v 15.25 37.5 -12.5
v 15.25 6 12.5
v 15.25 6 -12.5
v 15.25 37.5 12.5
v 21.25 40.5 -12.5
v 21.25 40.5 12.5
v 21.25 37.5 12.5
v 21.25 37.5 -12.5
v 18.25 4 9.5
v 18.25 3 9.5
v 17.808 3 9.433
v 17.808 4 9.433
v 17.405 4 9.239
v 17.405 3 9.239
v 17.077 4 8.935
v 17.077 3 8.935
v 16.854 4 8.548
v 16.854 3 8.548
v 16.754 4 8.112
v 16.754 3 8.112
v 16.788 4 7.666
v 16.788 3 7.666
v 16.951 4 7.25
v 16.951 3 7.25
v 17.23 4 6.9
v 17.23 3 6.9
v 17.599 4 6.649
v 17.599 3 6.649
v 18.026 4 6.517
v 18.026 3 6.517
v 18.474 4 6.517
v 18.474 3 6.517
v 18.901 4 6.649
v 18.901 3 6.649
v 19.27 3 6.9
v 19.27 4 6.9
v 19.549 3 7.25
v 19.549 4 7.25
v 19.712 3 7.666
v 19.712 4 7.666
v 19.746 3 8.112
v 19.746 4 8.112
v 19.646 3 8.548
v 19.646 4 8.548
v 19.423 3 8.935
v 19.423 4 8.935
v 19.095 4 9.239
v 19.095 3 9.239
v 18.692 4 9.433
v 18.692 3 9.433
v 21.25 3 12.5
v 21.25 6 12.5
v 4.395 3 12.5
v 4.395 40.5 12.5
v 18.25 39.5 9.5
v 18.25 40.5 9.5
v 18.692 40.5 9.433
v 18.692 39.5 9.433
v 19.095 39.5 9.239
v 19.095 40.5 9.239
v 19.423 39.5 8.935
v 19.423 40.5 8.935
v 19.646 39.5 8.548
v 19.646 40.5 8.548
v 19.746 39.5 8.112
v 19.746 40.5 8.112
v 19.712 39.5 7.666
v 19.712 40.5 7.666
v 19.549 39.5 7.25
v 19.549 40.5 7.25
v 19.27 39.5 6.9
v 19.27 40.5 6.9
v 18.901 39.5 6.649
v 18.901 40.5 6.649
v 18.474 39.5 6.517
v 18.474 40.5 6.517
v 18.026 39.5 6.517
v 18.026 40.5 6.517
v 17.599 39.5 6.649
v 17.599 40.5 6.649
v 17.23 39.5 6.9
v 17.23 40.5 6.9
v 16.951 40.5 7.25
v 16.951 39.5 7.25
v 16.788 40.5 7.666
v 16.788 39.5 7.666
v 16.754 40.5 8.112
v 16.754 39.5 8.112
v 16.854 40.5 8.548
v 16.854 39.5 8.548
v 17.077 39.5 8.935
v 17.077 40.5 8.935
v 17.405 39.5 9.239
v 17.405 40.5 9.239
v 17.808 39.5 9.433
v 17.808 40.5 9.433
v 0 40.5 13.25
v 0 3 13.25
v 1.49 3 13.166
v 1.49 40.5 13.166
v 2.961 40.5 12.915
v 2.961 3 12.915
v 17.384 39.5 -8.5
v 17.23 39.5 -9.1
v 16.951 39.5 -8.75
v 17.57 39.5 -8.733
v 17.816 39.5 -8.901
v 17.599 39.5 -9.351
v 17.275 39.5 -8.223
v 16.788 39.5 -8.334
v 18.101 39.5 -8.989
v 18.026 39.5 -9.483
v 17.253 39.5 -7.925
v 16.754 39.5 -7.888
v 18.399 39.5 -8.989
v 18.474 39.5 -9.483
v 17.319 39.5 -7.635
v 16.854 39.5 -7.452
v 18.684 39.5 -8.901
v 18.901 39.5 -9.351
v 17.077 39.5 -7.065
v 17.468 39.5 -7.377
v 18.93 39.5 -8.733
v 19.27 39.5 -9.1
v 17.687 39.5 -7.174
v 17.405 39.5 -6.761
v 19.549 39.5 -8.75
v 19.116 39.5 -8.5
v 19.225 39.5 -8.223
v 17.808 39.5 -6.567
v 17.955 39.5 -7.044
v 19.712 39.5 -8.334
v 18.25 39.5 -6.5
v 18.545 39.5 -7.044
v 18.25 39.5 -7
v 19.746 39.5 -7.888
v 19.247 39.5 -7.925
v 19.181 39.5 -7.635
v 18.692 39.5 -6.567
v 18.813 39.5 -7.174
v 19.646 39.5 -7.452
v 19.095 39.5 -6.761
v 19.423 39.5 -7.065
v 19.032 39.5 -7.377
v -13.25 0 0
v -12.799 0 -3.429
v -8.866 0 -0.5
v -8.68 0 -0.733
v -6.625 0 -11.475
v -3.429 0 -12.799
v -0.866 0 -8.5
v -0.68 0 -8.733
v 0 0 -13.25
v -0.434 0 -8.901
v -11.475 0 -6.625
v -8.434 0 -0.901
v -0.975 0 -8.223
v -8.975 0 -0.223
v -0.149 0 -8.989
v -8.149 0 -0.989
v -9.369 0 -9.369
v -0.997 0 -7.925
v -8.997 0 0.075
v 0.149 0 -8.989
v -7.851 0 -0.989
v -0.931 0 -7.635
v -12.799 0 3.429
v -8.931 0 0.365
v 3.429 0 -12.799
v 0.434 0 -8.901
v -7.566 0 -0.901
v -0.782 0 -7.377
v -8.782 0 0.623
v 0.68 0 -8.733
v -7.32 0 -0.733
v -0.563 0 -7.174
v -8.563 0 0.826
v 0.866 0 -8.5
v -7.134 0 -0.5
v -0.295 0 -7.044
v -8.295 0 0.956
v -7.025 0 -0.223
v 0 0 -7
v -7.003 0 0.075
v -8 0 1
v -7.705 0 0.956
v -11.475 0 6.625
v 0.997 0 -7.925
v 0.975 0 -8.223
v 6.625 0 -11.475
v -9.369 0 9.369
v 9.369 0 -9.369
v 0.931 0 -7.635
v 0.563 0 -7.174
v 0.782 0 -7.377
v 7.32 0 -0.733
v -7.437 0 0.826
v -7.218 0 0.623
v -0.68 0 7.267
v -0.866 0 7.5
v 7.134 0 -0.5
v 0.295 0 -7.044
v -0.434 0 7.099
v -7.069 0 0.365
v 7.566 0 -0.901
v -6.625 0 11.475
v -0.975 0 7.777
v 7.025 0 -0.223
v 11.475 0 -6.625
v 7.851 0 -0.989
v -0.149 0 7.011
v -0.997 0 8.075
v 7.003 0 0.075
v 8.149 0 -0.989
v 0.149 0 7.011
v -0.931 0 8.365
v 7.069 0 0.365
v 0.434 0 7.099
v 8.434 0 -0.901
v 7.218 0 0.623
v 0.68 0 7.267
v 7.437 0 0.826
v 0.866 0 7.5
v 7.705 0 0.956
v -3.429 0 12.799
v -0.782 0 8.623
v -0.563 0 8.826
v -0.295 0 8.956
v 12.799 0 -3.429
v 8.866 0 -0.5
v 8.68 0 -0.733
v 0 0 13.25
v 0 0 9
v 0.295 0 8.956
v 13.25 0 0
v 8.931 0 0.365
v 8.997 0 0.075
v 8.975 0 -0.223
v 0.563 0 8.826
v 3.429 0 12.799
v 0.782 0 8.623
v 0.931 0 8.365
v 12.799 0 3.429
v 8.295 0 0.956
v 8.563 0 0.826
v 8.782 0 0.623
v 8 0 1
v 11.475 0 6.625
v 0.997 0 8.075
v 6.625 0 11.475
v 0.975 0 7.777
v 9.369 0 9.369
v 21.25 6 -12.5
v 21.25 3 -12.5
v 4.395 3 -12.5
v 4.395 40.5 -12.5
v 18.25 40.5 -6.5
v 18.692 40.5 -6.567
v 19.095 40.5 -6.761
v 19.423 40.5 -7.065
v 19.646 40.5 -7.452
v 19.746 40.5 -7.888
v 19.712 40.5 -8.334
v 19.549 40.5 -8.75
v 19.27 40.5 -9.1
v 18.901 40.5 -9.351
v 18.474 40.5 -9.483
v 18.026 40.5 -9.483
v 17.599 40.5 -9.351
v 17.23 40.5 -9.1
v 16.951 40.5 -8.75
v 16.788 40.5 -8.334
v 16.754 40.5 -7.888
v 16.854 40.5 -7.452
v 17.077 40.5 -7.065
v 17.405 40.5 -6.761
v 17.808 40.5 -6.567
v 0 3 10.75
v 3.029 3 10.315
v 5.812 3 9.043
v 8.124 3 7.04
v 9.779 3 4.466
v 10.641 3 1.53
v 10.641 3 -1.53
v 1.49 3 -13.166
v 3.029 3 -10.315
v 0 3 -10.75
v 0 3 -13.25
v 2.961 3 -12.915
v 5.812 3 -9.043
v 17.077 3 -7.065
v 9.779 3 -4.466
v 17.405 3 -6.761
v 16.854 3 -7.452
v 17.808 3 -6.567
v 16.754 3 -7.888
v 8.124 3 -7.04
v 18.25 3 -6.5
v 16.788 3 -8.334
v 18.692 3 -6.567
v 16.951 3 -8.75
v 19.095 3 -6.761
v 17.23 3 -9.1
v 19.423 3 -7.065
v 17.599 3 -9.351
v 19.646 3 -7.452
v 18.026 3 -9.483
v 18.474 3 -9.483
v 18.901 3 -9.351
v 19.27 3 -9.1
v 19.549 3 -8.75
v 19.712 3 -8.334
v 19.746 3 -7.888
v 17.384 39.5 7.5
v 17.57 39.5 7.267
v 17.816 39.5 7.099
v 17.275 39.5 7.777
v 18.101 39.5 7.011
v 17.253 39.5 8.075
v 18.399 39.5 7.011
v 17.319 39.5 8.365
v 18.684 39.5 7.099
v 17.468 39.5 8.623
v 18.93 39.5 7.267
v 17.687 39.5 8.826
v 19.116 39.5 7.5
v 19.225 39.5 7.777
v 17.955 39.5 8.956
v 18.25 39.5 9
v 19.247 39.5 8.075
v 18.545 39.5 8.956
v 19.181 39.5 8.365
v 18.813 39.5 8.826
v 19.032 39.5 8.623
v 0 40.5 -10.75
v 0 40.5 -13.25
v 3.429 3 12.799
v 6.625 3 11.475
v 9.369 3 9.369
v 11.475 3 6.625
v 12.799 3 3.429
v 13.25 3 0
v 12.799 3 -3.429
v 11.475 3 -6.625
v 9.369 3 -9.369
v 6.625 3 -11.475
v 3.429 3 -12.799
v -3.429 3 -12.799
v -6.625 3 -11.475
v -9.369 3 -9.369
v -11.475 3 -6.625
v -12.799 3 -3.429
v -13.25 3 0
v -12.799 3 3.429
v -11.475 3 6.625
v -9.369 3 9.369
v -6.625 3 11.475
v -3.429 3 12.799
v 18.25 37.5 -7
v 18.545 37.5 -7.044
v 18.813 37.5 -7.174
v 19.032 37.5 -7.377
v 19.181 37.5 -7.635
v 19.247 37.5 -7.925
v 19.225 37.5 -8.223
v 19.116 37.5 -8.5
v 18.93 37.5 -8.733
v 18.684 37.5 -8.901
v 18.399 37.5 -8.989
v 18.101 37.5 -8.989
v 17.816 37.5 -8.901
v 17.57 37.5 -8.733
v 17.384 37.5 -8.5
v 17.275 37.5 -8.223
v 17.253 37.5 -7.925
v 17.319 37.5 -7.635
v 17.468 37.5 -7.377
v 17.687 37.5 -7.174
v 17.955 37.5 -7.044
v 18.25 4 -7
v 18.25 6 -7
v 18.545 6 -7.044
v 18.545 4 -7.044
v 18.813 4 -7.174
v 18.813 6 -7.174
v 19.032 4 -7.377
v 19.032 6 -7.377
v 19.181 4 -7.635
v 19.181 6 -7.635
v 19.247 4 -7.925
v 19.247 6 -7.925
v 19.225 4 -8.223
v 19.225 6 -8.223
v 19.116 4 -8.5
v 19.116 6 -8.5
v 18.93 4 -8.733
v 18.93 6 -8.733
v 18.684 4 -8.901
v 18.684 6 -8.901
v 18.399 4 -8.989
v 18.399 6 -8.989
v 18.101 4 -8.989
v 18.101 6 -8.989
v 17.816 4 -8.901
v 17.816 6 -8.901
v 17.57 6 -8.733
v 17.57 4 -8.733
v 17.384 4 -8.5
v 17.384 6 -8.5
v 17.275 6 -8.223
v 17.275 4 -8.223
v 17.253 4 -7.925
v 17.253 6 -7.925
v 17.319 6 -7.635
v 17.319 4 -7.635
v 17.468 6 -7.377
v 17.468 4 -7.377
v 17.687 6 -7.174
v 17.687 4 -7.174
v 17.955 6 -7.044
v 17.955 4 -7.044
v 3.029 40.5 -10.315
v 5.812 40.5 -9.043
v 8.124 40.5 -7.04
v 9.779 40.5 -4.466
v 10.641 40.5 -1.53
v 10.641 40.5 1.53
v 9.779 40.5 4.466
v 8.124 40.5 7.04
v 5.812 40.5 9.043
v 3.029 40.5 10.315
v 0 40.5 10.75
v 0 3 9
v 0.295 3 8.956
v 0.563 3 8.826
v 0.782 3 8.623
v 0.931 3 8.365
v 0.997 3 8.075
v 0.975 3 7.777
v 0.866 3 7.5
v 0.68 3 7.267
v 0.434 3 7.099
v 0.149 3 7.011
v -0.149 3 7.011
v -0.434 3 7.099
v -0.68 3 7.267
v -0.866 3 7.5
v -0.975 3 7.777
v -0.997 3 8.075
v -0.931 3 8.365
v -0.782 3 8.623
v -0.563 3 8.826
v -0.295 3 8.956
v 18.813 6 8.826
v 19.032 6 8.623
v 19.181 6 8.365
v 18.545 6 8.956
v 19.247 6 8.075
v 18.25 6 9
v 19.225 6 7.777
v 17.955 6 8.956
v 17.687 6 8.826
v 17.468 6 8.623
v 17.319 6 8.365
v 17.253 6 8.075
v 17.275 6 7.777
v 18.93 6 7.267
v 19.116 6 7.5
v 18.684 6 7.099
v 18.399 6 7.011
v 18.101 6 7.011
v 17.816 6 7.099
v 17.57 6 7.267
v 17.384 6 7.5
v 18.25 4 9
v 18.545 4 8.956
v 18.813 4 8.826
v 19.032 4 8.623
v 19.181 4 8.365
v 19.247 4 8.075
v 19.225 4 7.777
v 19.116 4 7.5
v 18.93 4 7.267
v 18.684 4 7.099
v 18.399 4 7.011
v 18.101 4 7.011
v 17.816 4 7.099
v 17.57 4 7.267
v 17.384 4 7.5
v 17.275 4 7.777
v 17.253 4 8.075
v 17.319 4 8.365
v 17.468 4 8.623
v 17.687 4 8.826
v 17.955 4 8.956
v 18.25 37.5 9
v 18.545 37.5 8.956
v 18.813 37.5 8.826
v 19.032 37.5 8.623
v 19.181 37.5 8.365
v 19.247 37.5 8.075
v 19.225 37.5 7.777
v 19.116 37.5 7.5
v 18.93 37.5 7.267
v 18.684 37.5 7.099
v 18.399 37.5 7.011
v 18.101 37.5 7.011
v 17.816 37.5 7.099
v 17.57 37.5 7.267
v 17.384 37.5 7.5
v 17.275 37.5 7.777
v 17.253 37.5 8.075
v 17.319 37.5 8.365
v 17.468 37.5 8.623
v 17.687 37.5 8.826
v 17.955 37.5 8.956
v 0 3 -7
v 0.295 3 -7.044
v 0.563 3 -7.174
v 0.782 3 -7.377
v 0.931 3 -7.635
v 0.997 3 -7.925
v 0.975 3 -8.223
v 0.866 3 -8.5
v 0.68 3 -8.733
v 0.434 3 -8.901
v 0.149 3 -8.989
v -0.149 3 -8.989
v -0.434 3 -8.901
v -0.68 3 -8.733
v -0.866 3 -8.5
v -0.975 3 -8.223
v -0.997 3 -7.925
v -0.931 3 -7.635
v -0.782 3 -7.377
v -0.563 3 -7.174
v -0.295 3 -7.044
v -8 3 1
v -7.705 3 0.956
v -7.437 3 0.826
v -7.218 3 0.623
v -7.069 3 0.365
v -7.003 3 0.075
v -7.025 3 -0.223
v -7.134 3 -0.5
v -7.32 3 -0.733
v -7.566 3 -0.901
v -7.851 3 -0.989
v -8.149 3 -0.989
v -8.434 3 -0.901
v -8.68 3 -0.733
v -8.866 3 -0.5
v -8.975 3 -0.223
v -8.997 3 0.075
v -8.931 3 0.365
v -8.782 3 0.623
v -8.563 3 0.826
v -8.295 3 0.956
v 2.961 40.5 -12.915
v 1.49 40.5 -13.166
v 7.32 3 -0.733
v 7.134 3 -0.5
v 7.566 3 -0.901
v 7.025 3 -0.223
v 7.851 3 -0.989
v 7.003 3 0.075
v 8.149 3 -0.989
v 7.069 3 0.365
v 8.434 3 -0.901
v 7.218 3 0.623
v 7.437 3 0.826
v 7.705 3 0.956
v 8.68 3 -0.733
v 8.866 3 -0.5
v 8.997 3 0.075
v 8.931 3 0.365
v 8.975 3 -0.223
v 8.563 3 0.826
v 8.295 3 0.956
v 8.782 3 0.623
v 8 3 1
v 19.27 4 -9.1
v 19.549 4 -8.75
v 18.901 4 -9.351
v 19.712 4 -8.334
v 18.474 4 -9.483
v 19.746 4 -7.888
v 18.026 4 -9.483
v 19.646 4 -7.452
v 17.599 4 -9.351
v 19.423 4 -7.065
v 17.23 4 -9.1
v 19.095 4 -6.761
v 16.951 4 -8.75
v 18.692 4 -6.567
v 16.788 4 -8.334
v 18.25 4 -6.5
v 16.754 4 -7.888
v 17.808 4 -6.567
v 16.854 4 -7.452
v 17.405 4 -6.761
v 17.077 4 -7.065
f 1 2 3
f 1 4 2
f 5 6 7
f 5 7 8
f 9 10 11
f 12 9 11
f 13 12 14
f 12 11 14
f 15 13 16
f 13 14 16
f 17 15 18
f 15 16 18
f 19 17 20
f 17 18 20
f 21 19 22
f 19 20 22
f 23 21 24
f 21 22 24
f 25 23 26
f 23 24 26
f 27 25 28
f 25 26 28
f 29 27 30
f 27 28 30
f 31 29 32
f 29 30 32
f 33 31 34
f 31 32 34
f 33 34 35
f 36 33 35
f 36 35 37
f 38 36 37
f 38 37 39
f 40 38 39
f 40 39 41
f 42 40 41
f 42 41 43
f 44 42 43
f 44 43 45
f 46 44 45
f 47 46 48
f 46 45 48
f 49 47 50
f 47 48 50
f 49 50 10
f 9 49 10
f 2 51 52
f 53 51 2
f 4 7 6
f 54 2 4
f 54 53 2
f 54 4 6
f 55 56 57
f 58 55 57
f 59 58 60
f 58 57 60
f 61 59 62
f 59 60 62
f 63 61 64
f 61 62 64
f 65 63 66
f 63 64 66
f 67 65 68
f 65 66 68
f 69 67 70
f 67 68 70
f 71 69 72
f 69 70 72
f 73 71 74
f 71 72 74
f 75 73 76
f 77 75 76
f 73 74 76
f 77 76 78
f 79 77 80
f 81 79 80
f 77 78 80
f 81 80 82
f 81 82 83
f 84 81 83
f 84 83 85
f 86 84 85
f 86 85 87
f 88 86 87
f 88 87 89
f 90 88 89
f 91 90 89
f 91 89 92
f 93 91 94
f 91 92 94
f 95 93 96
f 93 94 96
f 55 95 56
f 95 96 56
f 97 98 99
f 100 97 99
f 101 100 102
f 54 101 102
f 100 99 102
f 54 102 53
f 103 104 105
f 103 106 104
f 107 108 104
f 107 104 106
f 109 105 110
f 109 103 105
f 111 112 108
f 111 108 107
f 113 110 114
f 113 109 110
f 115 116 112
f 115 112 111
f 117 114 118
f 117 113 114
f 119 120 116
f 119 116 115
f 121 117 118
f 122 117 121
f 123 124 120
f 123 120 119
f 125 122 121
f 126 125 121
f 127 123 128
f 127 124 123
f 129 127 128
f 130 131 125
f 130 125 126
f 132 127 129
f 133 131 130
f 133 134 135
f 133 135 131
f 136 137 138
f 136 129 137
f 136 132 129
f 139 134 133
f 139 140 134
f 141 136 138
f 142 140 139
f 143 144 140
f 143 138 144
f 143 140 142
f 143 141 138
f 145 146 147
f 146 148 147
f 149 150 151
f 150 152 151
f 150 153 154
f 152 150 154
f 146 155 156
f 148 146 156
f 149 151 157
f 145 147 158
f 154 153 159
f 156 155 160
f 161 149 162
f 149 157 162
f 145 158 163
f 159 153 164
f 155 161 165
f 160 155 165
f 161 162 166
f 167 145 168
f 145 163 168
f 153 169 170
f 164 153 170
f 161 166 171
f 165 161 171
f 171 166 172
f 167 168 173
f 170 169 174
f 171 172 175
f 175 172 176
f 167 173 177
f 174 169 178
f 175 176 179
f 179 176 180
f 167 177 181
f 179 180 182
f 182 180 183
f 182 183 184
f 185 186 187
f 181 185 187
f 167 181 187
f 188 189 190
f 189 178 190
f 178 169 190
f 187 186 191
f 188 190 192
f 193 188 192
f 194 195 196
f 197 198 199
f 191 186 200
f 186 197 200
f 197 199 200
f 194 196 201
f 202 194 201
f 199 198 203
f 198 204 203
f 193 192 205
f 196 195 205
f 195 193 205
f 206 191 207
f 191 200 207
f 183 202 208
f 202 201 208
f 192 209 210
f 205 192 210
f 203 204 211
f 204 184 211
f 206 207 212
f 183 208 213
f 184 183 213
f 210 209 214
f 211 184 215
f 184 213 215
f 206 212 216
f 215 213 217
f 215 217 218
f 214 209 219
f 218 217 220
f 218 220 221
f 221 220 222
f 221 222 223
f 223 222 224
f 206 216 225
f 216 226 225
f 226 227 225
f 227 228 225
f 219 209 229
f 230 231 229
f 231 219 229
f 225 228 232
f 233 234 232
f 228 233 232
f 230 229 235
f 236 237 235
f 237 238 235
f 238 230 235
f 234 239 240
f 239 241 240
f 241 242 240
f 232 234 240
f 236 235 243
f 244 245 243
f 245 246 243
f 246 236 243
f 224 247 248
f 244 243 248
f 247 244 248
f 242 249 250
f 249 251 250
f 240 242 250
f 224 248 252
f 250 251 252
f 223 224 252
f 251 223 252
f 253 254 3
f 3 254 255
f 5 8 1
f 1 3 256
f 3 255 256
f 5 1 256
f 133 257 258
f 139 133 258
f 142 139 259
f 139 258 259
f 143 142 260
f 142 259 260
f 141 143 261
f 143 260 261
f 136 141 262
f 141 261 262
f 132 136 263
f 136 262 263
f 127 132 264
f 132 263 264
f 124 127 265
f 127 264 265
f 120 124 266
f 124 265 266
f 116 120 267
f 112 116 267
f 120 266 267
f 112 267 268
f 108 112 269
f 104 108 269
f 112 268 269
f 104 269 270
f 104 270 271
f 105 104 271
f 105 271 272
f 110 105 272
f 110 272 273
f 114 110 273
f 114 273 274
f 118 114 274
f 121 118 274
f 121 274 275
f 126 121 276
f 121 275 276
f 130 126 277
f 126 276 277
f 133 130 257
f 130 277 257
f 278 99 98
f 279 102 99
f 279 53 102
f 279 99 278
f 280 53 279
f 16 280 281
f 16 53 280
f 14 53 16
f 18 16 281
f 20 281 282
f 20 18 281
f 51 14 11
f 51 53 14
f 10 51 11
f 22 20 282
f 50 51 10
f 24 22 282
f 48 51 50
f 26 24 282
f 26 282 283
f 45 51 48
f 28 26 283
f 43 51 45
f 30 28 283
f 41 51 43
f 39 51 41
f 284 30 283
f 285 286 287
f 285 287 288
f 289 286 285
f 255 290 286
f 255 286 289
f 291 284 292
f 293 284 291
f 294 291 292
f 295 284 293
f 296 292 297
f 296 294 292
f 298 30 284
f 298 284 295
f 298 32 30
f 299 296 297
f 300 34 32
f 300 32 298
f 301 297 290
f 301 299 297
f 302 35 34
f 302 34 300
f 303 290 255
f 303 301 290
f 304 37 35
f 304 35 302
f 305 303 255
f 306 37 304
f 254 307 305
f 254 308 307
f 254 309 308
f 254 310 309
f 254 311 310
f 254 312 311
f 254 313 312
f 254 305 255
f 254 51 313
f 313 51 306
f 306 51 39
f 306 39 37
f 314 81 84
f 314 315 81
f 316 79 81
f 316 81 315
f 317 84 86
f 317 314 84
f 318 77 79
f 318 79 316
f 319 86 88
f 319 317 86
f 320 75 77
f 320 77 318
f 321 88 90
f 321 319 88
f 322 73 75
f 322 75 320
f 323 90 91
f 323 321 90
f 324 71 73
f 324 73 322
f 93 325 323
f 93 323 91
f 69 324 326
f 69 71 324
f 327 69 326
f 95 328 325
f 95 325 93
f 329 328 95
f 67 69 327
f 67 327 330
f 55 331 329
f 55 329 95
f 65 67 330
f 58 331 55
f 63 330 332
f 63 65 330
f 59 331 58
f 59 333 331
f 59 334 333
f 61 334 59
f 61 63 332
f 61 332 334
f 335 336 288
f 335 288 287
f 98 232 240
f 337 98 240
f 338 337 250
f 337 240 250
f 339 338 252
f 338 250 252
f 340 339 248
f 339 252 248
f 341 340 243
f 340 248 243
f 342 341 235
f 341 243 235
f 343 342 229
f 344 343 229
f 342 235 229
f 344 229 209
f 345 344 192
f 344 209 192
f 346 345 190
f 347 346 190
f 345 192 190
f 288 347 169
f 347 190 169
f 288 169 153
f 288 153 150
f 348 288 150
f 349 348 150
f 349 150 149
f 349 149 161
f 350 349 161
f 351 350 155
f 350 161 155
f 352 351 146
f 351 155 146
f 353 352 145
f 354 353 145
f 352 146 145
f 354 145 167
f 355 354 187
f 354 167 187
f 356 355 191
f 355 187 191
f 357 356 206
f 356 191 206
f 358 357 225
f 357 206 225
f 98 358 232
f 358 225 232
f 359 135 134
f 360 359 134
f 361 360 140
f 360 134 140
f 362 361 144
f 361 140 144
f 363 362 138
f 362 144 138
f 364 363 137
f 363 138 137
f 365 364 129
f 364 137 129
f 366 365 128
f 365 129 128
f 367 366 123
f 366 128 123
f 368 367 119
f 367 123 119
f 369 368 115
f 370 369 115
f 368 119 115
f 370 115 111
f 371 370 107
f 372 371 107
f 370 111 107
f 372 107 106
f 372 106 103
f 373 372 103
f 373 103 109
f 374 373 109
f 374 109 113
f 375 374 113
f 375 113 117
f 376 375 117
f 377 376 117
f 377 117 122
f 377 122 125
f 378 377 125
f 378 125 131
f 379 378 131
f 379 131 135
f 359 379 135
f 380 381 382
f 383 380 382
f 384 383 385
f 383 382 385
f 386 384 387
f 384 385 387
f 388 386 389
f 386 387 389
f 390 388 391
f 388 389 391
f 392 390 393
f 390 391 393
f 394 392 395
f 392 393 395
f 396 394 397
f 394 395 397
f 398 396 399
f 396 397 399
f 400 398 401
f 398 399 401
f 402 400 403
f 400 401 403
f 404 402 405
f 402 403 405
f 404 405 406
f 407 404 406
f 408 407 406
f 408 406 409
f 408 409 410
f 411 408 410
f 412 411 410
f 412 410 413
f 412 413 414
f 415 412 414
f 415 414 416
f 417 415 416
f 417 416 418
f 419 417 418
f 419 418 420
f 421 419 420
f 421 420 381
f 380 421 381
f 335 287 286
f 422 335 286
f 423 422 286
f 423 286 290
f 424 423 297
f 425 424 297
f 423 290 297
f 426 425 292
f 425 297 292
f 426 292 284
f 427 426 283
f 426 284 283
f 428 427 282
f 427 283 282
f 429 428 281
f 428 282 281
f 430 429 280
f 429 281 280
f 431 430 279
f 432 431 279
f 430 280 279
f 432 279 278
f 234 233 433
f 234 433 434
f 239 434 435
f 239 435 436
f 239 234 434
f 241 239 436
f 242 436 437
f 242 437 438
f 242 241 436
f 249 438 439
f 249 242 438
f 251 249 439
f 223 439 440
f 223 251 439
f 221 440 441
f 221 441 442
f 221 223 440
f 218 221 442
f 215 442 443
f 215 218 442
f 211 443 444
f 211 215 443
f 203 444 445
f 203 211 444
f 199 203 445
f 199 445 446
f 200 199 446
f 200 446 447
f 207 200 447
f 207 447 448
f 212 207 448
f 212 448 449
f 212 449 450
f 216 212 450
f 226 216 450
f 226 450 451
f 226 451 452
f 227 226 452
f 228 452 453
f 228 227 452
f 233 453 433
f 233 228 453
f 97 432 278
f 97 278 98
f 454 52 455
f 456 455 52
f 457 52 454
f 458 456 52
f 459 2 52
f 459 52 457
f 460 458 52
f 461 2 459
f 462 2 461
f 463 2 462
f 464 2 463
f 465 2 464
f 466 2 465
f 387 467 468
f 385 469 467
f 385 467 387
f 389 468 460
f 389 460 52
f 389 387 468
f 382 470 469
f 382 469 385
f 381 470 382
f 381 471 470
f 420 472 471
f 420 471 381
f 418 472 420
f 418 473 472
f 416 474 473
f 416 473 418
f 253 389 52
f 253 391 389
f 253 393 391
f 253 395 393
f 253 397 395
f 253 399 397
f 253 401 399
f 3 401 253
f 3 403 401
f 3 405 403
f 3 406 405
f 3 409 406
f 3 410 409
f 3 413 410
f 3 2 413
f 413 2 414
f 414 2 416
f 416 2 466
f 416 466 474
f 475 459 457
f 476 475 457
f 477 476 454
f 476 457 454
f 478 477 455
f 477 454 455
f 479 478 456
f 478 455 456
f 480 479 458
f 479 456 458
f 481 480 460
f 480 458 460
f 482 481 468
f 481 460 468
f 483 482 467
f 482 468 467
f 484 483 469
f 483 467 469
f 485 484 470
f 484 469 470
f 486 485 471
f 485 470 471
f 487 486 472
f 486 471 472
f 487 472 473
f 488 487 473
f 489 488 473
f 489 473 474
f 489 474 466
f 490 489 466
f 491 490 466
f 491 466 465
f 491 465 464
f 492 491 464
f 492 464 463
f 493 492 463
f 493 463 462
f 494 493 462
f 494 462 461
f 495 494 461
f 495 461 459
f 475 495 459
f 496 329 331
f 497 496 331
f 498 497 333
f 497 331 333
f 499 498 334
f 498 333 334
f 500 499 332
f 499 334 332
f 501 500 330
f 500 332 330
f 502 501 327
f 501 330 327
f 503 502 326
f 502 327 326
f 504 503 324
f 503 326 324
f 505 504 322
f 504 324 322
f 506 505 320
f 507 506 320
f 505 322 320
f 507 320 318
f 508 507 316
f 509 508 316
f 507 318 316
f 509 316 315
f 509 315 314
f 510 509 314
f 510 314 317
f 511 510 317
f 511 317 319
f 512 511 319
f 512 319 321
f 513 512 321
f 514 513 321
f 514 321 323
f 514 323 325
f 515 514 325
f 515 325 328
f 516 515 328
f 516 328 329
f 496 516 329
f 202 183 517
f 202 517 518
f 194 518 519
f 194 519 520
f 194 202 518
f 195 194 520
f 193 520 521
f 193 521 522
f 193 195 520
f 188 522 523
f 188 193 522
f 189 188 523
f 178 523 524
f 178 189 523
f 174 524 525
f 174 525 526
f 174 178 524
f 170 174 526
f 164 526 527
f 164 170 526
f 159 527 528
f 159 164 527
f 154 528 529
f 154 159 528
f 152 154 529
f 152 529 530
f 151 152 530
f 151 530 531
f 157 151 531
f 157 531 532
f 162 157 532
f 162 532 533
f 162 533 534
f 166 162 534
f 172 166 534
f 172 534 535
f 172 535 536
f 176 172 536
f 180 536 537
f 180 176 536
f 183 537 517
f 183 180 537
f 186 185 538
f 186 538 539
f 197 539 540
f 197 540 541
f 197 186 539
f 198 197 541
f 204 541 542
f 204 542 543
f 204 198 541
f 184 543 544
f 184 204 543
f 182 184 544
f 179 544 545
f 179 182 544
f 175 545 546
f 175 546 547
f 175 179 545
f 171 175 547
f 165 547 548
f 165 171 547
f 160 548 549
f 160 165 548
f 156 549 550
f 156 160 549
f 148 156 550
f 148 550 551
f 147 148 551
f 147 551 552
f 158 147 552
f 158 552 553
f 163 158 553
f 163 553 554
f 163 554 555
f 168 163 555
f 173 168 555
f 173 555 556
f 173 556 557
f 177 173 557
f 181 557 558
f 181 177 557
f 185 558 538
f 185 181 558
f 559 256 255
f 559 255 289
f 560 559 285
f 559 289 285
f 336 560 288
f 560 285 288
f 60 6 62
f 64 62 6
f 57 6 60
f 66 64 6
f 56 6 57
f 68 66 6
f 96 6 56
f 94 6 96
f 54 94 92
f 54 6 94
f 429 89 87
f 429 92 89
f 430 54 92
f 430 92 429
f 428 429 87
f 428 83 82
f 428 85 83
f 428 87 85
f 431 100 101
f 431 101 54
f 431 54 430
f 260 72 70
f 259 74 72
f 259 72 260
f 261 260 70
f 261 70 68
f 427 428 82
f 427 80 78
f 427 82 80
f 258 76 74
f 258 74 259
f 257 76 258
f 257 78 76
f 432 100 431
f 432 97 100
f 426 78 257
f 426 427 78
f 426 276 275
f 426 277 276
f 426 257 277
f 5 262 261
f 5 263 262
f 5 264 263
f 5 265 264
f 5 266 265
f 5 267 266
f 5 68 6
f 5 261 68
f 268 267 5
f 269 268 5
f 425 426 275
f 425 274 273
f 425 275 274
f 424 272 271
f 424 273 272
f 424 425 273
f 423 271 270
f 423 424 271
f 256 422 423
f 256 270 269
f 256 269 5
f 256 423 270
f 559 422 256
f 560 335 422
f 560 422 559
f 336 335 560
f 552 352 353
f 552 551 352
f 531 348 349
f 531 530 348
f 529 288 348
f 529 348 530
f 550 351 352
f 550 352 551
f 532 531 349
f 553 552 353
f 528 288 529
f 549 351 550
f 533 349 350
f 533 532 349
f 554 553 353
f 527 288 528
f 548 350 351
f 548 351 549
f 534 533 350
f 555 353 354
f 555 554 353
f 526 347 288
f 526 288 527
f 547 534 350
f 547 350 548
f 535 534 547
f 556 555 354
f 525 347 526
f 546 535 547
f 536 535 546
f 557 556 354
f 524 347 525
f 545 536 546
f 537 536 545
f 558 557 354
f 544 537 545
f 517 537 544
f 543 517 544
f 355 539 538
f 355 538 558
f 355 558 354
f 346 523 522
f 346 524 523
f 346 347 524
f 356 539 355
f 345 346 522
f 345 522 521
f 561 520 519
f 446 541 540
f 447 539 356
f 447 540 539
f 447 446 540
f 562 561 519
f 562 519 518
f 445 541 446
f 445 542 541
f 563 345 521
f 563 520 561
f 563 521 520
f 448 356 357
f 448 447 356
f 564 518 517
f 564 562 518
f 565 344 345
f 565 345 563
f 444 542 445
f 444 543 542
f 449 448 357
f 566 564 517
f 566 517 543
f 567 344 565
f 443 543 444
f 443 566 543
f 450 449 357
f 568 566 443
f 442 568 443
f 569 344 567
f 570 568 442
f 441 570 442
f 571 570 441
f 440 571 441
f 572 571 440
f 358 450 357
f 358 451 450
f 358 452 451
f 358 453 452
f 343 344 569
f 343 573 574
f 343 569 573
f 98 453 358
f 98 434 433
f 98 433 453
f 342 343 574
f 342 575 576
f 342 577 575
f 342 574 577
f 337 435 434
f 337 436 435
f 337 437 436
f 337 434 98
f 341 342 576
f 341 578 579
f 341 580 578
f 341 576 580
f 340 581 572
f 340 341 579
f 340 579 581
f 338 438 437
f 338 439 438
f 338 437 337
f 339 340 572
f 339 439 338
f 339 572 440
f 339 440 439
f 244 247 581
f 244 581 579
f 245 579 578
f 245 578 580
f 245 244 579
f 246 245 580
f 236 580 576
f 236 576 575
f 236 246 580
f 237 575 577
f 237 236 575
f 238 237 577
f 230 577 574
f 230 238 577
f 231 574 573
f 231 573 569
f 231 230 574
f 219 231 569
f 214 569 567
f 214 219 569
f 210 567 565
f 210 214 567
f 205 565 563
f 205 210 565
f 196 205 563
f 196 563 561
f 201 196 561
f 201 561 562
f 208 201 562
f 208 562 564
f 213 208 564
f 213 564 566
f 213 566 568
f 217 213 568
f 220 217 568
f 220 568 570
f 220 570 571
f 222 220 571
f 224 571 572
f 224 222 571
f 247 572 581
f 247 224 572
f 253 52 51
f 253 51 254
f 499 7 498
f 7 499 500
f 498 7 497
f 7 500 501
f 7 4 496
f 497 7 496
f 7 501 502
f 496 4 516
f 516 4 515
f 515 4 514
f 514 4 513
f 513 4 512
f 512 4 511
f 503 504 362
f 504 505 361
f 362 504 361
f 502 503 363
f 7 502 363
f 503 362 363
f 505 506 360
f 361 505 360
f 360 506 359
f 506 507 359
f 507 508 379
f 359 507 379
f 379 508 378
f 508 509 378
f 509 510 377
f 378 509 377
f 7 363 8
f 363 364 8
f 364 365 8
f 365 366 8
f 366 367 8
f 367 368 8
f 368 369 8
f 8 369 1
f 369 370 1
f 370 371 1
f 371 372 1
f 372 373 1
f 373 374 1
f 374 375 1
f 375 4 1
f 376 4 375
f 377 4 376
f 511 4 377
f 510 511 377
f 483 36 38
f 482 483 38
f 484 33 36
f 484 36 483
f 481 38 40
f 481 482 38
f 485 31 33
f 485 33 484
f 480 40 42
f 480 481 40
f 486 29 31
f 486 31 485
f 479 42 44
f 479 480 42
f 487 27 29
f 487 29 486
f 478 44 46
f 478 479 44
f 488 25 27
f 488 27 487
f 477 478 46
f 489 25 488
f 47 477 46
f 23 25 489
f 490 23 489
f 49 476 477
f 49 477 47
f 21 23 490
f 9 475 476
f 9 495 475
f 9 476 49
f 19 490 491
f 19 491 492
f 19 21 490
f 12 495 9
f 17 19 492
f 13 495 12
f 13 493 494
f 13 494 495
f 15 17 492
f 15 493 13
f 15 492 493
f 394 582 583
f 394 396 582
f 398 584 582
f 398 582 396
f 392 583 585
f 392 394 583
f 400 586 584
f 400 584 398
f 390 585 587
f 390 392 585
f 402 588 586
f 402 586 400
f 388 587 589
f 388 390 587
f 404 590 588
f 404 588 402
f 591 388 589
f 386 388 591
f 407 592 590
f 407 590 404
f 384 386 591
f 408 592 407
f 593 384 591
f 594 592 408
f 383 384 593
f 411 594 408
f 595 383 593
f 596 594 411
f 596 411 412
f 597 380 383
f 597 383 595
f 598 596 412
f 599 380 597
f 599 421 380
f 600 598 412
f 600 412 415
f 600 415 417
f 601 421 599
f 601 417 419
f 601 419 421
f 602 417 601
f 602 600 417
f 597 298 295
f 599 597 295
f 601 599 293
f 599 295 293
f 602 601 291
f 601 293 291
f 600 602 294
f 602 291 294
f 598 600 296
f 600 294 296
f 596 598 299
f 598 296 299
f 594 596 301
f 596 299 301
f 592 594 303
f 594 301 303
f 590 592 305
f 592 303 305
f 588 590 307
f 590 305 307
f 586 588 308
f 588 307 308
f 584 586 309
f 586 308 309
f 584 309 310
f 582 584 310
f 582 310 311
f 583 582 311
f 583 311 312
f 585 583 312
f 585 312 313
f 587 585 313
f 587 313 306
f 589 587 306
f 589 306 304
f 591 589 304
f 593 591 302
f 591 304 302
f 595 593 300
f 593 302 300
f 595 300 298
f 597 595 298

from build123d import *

# Parameters (mm, degrees)
SKETCH1_R                = 13.25
SKETCH1_R_2              = 1
BOSS_EXTRUDE1_DEPTH      = 3
BOSS_EXTRUDE4_DEPTH      = 37.5
BOSS_EXTRUDE5_REACH      = 53.265
BOSS_EXTRUDE5_END_RADIUS = 13.25
SKETCH4_W                = 12.5
SKETCH4_H                = 37.5
SKETCH6_W                = 25
SKETCH6_H                = 3
BOSS_EXTRUDE6_DEPTH      = 6
SKETCH7_R                = 1
CUT_EXTRUDE1_DEPTH       = 48.616961264
SKETCH8_R                = 1.5
CUT_EXTRUDE2_DEPTH       = 1
SKETCH9_R                = 1.5
CUT_EXTRUDE3_DEPTH       = 1


with BuildPart() as part:
    # Sketch1 → Boss-Extrude1 (new body)
    with BuildSketch(Plane(origin=(0, 0, 0), x_dir=(1, 0, 0), z_dir=(0, 1, 0))):
        with Locations(Location((0, 0, 0), (0, 0, 270))):
            Circle(SKETCH1_R)
        with Locations(Location((-8, 0, 0), (0, 0, 270))):
            Circle(SKETCH1_R_2, mode=Mode.SUBTRACT)
        with Locations(Location((0, 8, 0), (0, 0, 270))):
            Circle(SKETCH1_R_2, mode=Mode.SUBTRACT)
        with Locations(Location((8, 0, 0), (0, 0, 270))):
            Circle(SKETCH1_R_2, mode=Mode.SUBTRACT)
        with Locations(Location((0, -8, 0), (0, 0, 270))):
            Circle(SKETCH1_R_2, mode=Mode.SUBTRACT)
    extrude(amount=BOSS_EXTRUDE1_DEPTH)


with BuildPart() as body_2:
    # Sketch2 → Boss-Extrude4 (new body)
    with BuildSketch(Plane(origin=(0, 3, 0), x_dir=(1, 0, 0), z_dir=(0, 1, 0))):
        with BuildLine():
            Line((0, 13.25), (0, 10.75))
            ThreePointArc((0, 10.75), (10.75, 0), (0, -10.75))
            Line((0, -10.75), (0, -13.25))
            ThreePointArc((0, -13.25), (13.25, 0), (0, 13.25))
        make_face()
    extrude(amount=BOSS_EXTRUDE4_DEPTH)

    # Boss-Extrude5: up to this cylinder (the profile starts outside it)
    boss_extrude5_end = Plane(origin=(0, 21.75, 0), z_dir=(0, -1, 0)) * Cylinder(BOSS_EXTRUDE5_END_RADIUS, 134.03, mode=Mode.PRIVATE)
    # Sketch4 → Boss-Extrude5 (add, up to the surface)
    with BuildSketch(Plane(origin=(15.25, 0, 0), x_dir=(0, 0, -1), z_dir=(1, 0, 0)), mode=Mode.PRIVATE) as boss_extrude5_sk1:
        with Locations((-6.25, 21.75)):
            Rectangle(SKETCH4_W, SKETCH4_H)
    boss_extrude5_tool1 = extrude(boss_extrude5_sk1.sketch, amount=-BOSS_EXTRUDE5_REACH, mode=Mode.PRIVATE) - boss_extrude5_end
    add(boss_extrude5_tool1.solids().sort_by_distance((15.25, 21.75, 6.25))[0])
    # Sketch4 → Boss-Extrude5 (add, up to the surface)
    with BuildSketch(Plane(origin=(15.25, 0, 0), x_dir=(0, 0, -1), z_dir=(1, 0, 0)), mode=Mode.PRIVATE) as boss_extrude5_sk2:
        with Locations((6.25, 21.75)):
            Rectangle(SKETCH4_W, SKETCH4_H)
    boss_extrude5_tool2 = extrude(boss_extrude5_sk2.sketch, amount=-BOSS_EXTRUDE5_REACH, mode=Mode.PRIVATE) - boss_extrude5_end
    add(boss_extrude5_tool2.solids().sort_by_distance((15.25, 21.75, -6.25))[0])

    # Sketch6 → Boss-Extrude6 (add)
    with BuildSketch(Plane(origin=(15.25, 0, 0), x_dir=(0, 0, -1), z_dir=(1, 0, 0))):
        with Locations((0, 39)):
            Rectangle(SKETCH6_W, SKETCH6_H)
        with Locations((0, 4.5)):
            Rectangle(SKETCH6_W, SKETCH6_H)
    extrude(amount=BOSS_EXTRUDE6_DEPTH)

    # Sketch7 → Cut-Extrude1 (cut, through all)
    with BuildSketch(Plane(origin=(0, 40.5, 0), x_dir=(1, 0, 0), z_dir=(0, 1, 0))):
        with Locations(Location((18.25, 8, 0), (0, 0, 270))):
            Circle(SKETCH7_R)
        with Locations(Location((18.25, -8, 0), (0, 0, 270))):
            Circle(SKETCH7_R)
    extrude(amount=-CUT_EXTRUDE1_DEPTH, mode=Mode.SUBTRACT)

    # Sketch8 → Cut-Extrude2 (cut)
    with BuildSketch(Plane(origin=(0, 40.5, 0), x_dir=(1, 0, 0), z_dir=(0, 1, 0))):
        with Locations(Location((18.25, 8, 0), (0, 0, 270))):
            Circle(SKETCH8_R)
        with Locations(Location((18.25, -8, 0), (0, 0, 270))):
            Circle(SKETCH8_R)
    extrude(amount=-CUT_EXTRUDE2_DEPTH, mode=Mode.SUBTRACT)

    # Sketch9 → Cut-Extrude3 (cut)
    with BuildSketch(Plane.XZ.offset(-3)):
        with Locations(Location((18.25, 8, 0), (0, 0, 90))):
            Circle(SKETCH9_R)
        with Locations(Location((18.25, -8, 0), (0, 0, 90))):
            Circle(SKETCH9_R)
    extrude(amount=-CUT_EXTRUDE3_DEPTH, mode=Mode.SUBTRACT)


solid = Compound([part.part, body_2.part])
